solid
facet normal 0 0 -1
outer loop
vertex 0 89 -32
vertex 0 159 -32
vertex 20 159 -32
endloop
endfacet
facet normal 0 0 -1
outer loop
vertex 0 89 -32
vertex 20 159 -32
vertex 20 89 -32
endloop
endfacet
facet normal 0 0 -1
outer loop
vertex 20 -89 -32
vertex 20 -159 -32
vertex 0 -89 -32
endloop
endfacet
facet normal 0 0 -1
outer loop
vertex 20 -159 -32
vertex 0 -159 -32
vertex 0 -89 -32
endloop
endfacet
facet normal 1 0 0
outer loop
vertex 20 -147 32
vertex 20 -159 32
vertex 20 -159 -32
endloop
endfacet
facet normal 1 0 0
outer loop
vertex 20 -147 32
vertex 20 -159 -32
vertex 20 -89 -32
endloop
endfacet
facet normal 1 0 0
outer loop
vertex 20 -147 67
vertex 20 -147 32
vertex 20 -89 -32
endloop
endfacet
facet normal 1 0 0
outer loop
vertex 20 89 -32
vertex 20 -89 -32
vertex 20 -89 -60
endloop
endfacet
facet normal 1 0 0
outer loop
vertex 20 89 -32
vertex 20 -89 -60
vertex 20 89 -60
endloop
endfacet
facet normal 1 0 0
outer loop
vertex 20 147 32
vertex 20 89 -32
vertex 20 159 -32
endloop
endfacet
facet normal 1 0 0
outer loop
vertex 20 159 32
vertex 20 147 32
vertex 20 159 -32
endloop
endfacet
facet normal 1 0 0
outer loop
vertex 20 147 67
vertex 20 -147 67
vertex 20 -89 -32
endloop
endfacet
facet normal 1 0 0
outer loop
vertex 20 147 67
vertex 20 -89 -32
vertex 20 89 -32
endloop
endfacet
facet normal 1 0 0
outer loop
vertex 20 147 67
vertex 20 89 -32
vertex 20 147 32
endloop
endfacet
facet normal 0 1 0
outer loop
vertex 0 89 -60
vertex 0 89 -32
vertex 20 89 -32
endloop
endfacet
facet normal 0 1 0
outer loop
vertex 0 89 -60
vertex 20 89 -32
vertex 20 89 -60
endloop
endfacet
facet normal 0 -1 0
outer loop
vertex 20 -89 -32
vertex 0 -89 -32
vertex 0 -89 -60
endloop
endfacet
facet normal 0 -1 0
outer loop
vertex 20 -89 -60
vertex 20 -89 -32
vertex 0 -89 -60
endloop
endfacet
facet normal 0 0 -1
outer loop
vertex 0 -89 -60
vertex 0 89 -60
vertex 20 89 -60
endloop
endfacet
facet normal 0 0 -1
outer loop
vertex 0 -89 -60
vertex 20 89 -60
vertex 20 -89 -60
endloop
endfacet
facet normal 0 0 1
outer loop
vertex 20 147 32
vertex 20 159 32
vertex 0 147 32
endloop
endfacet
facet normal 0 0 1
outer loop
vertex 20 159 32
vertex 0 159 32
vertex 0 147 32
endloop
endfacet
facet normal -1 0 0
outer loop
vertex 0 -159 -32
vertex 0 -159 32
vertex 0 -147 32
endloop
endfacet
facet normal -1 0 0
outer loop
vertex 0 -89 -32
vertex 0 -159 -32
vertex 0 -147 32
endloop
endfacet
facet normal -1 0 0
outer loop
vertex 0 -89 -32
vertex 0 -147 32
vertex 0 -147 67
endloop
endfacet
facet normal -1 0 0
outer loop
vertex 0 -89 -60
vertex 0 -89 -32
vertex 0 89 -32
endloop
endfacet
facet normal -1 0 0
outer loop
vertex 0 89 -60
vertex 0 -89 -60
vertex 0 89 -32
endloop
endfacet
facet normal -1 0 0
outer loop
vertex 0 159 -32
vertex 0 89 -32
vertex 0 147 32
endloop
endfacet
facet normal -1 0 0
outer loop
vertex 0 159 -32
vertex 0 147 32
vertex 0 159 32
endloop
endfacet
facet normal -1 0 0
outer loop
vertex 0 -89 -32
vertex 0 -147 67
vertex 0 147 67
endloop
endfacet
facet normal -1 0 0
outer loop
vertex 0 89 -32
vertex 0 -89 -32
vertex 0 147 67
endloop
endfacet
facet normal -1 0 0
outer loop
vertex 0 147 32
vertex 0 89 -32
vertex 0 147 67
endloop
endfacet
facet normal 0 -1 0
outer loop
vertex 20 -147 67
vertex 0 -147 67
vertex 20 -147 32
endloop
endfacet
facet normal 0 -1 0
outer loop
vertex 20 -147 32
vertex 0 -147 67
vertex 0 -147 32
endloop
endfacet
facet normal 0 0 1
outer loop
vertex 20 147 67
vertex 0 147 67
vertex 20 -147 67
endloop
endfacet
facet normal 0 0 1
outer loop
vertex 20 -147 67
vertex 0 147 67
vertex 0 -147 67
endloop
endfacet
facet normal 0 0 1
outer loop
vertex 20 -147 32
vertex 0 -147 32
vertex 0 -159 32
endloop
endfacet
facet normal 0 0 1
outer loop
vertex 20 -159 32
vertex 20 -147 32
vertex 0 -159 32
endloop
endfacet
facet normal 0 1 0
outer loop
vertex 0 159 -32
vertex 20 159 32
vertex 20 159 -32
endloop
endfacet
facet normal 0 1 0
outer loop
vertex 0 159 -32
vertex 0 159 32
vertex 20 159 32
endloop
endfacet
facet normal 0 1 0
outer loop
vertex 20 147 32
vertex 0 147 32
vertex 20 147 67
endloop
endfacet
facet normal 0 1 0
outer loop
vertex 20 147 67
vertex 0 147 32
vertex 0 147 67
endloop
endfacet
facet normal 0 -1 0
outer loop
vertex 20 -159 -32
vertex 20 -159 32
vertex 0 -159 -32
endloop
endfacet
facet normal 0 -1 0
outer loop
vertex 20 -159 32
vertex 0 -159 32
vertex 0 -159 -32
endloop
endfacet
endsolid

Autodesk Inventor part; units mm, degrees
ref_plane "YZ Plane" through (0, 0, 0) normal (1, 0, 0) x (0, 1, 0)
ref_plane "XZ Plane" through (0, 0, 0) normal (0, 1, 0) x (-1, 0, 0)
ref_plane "XY Plane" through (0, 0, 0) normal (0, 0, 1) x (1, 0, 0)
sketch "Sketch1" plane through (0, 0, 0) normal (1, 0, 0) x (0, 1, 0)
  line L0 (159, 32) -> (159, -32)
  line L1 (159, -32) -> (89, -32)
  line L2 (89, -32) -> (89, -60)
  line L3 (89, -60) -> (-89, -60)
  line L4 (159, 32) -> (147, 32)
  line L5 (147, 32) -> (147, 67)
  line L6 (147, 67) -> (-147, 67)
  line L7 (-147, 67) -> (-147, 32)
  line L8 (-147, 32) -> (-159, 32)
  line L9 (-159, 32) -> (-159, -32)
  line L10 (-159, -32) -> (-89, -32)
  line L11 (-89, -32) -> (-89, -60)
  point P0 (0, 0)
  point P1 (159, 0)
  point P2 (0, 67)
  dimension "d0" = 64
  dimension "d1" = 70
  dimension "d2" = 178
  dimension "d3" = 28
  dimension "d4" = 12
  dimension "d5" = 35
  dimension "d6" = 12
  dimension "d7" = 64
  dimension "d8" = 70
  dimension "d9" = 35
extrude "Extrusion1" add sketch "Sketch1" along normal blind 20
properties part number "battlebotspinner20mmplate"
